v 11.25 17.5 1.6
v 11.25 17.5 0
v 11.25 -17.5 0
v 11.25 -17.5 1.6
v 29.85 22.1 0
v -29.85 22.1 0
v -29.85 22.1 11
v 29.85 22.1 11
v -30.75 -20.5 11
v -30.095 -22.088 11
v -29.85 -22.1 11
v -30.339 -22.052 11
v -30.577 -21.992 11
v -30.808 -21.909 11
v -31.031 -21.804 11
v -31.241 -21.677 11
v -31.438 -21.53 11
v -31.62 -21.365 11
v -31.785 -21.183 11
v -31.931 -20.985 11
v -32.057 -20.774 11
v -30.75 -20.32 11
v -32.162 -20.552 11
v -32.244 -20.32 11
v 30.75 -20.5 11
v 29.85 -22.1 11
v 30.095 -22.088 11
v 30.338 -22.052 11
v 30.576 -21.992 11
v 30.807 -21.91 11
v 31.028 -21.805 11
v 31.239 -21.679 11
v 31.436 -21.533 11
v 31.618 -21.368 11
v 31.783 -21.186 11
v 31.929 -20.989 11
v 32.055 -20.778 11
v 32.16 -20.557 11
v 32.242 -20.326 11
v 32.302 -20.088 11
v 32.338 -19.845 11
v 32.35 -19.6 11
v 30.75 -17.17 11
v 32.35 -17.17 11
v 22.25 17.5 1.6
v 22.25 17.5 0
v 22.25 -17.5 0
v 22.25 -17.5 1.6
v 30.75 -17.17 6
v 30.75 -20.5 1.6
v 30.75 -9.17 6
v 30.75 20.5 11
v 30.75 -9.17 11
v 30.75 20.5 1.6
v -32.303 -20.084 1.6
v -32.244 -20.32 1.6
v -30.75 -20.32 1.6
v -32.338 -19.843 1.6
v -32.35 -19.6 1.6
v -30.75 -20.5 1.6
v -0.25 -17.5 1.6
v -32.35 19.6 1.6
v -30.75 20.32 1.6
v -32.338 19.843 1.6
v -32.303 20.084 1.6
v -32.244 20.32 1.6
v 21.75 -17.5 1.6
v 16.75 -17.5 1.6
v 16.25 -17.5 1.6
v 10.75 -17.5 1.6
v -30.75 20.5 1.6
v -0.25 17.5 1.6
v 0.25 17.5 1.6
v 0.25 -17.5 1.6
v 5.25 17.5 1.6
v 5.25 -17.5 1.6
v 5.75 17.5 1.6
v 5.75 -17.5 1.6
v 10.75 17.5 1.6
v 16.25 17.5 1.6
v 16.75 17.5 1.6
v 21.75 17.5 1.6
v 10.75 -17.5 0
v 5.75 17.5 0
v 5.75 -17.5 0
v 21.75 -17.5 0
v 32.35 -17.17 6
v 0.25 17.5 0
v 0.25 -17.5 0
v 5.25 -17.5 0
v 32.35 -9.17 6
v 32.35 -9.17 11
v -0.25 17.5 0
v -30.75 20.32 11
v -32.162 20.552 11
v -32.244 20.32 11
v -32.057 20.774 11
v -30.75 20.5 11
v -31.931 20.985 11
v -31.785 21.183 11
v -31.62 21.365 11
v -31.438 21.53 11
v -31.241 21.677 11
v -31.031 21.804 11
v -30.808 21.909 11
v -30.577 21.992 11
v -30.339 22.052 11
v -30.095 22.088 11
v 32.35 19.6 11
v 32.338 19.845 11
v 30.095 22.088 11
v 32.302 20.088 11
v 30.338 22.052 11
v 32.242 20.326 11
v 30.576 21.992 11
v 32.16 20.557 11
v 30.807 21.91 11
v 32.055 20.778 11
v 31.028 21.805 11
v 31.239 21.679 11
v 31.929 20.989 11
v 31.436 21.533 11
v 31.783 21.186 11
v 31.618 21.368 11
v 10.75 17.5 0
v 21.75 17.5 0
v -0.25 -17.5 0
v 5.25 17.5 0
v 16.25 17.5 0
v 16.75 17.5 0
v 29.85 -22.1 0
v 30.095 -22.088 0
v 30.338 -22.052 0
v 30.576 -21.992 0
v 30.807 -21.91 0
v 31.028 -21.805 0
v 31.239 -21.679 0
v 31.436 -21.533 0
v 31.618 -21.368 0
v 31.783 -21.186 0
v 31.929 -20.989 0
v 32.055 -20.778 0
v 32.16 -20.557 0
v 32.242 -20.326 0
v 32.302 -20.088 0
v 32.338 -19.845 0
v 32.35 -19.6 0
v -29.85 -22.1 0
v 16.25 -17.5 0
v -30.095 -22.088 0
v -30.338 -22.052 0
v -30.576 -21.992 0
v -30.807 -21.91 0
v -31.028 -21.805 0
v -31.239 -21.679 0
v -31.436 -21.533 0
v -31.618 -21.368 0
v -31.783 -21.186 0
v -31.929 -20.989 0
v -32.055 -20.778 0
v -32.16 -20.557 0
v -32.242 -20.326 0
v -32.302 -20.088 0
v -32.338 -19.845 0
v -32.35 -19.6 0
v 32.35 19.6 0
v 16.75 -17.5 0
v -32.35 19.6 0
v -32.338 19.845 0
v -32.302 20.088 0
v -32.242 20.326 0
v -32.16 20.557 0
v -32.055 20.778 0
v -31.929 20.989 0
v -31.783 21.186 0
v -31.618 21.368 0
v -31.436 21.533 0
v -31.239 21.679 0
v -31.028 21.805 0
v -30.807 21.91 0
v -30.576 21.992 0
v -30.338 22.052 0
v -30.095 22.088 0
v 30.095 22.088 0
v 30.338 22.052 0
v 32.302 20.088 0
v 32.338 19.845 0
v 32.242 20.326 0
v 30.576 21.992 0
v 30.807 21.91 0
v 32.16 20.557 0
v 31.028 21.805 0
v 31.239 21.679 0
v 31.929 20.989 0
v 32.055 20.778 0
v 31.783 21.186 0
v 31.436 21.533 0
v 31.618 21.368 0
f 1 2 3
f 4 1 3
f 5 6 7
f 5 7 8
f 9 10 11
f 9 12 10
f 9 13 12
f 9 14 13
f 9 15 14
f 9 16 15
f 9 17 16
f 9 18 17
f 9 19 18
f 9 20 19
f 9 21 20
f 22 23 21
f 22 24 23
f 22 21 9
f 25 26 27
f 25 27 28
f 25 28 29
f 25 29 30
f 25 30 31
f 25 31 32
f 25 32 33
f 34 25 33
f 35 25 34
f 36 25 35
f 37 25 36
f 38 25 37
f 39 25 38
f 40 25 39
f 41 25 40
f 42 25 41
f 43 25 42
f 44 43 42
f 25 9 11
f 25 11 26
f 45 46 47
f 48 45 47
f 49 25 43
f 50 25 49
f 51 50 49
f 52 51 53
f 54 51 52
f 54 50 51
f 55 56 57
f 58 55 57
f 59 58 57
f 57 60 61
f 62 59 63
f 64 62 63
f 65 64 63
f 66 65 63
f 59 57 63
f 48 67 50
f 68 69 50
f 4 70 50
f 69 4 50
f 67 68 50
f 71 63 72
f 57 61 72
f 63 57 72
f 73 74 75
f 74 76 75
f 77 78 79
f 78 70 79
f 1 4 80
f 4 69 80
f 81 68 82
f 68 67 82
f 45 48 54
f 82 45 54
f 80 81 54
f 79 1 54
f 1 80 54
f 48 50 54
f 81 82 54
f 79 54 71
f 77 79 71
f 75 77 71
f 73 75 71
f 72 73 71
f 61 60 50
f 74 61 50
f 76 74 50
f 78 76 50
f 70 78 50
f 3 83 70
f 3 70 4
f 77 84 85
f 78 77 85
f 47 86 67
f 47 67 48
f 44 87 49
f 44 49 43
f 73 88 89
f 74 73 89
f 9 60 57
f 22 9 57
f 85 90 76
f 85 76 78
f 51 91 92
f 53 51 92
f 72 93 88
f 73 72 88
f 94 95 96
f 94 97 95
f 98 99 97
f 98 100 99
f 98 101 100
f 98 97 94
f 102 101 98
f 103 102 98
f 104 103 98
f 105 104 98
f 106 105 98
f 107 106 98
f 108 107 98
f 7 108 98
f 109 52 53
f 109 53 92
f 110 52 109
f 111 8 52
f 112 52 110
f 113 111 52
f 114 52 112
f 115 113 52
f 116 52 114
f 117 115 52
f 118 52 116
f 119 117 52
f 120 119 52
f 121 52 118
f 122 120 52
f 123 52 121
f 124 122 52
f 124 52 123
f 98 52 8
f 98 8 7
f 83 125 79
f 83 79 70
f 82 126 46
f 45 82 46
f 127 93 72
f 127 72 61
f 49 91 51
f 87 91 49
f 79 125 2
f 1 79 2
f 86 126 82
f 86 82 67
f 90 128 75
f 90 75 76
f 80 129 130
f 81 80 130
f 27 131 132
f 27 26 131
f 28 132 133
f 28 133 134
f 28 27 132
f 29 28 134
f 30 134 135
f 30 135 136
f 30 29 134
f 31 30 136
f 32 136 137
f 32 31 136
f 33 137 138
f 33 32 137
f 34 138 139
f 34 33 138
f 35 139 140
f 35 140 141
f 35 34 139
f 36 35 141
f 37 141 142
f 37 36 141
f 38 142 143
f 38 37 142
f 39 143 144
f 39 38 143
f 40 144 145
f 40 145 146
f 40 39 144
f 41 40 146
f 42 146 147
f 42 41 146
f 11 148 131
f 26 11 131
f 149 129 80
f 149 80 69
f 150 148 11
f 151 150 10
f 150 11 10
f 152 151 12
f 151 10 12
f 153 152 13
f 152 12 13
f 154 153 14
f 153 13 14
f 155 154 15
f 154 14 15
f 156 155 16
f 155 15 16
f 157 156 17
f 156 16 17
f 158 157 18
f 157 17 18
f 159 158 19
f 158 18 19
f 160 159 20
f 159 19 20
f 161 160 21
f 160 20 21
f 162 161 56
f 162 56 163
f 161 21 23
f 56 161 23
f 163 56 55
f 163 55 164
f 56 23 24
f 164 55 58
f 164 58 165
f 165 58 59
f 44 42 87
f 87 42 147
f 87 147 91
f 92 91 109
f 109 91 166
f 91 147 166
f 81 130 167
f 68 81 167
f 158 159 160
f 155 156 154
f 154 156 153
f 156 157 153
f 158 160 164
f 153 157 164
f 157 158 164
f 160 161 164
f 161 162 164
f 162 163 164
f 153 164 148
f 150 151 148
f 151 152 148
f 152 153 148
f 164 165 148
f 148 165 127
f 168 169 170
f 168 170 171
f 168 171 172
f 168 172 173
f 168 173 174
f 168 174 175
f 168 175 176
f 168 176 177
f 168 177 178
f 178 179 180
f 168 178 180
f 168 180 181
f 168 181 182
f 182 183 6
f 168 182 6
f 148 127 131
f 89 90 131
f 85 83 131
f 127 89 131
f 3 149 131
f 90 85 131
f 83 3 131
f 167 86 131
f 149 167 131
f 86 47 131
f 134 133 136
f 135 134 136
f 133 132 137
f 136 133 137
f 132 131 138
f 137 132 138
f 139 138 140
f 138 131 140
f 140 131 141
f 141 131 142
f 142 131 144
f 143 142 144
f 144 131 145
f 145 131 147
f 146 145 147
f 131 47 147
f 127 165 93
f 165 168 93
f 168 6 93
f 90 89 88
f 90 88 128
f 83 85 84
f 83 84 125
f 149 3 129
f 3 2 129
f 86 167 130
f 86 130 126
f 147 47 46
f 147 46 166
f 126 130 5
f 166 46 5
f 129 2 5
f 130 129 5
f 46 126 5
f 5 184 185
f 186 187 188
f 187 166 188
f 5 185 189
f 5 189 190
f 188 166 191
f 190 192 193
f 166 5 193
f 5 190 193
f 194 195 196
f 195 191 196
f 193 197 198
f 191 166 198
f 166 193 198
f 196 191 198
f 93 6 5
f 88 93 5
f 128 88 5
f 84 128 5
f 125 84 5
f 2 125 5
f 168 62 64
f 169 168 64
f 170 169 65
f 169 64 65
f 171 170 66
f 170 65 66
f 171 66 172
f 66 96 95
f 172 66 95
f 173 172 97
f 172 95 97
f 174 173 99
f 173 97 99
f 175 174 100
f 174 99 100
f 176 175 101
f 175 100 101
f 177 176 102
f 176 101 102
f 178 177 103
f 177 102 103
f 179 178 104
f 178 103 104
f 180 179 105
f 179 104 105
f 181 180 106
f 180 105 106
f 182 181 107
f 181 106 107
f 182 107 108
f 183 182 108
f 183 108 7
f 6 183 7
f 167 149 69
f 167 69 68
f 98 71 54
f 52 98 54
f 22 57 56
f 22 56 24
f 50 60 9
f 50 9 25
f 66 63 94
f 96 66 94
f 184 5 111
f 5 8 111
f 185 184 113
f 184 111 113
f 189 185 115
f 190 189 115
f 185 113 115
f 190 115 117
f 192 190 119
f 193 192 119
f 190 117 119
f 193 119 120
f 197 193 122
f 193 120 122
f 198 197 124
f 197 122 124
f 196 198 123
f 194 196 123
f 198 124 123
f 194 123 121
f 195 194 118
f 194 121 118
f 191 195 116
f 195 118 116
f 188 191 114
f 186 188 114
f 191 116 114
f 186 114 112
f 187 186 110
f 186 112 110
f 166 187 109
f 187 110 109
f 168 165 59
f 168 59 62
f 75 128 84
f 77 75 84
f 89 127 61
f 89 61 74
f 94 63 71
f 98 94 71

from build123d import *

# Parameters (mm, degrees)
F0_W      = 60.5
F0_H      = 40.64
F1_DEPTH  = 12.7
F2_W      = 64.6999999881
F2_H      = 44.1999999881
F2_W_2    = 61.5
F2_H_2    = 41
F3_DEPTH  = 11
F4_DEPTH  = 1.6
F5_DEPTH  = 8.8
F6_W      = 0.5
F6_H      = 35
F7_DEPTH  = 16
F8_DEPTH  = 60.7
F9_R      = 2.5
F10_R     = 2.5
F11_W     = 8
F11_H     = 5
F12_DEPTH = 1.71


# Not quite as in the source:
# - a feature names something its author has since deleted; it is built from what else it names


with BuildPart() as f1:
    # F0 (on Top) → F1 (new body)
    with BuildSketch(Plane.XY):
        Rectangle(F0_W, F0_H)
    extrude(amount=F1_DEPTH)



with BuildPart() as f3:
    # F2 (on Top) → F3 (new body)
    with BuildSketch(Plane.XY):
        Rectangle(F2_W, F2_H)
        Rectangle(F2_W_2, F2_H_2, mode=Mode.SUBTRACT)
    extrude(amount=F3_DEPTH)


with BuildPart() as f1_1:
    add(f1.part)

    add(f3.part)  # F4 merges F3
    # F2 (on Top) → F4 (join)
    with BuildSketch(Plane.XY):
        Rectangle(F2_W_2, F2_H_2)
    extrude(amount=F4_DEPTH)

    # F5 (cut): a face of the model
    f5_faces = [f1_1.faces().sort_by_distance(p)[0] for p in [
        (-30.25, 0, 7.15),
    ]]
    extrude(f5_faces, amount=F5_DEPTH, mode=Mode.SUBTRACT)

    # F6 (on face) → F7 (cut)
    with BuildSketch(Plane(origin=(0, 0, 0), x_dir=(1, 0, 0), z_dir=(0, 0, -1))):
        with Locations((22, 0)):
            Rectangle(F6_W, F6_H)
        with Locations((16.5, 0)):
            Rectangle(F6_W, F6_H)
        with Locations((11, 0)):
            Rectangle(F6_W, F6_H)
        with Locations((5.5, 0)):
            Rectangle(F6_W, F6_H)
        Rectangle(F6_W, F6_H)
    extrude(amount=-F7_DEPTH, mode=Mode.SUBTRACT)

    # F8 (cut): a face of the model
    f8_faces = [f1_1.faces().sort_by_distance(p)[0] for p in [
        (-30.25, 0, 7.15),
    ]]
    extrude(f8_faces, amount=-F8_DEPTH, mode=Mode.SUBTRACT)

    # F9
    f9_edges = [f1_1.edges().sort_by_distance(p)[0] for p in [
        (32.35, 22.1, 5.5),
        (32.35, -22.1, 5.5),
    ]]
    fillet(f9_edges, radius=F9_R)

    # F10
    f10_edges = [f1_1.edges().sort_by_distance(p)[0] for p in [
        (-32.35, 22.1, 5.5),
        (-32.35, -22.1, 5.5),
    ]]
    fillet(f10_edges, radius=F10_R)

    # F14: F12 across plane


with BuildPart() as f12:
    # F11 (on face) → F12 (new body)
    with BuildSketch(Plane.YZ.offset(32.349999994)):
        with Locations((13.1696772724, 8.5)):
            Rectangle(F11_W, F11_H)
    extrude(amount=-F12_DEPTH)


with BuildPart() as f1_2:
    add(f1_1.part)
    add(f12.part.mirror(Plane(origin=(0, 0, 5.5), x_dir=(-1, 0, 0), z_dir=(0, 1, 0))), mode=Mode.SUBTRACT)


solid = f1_2.part
